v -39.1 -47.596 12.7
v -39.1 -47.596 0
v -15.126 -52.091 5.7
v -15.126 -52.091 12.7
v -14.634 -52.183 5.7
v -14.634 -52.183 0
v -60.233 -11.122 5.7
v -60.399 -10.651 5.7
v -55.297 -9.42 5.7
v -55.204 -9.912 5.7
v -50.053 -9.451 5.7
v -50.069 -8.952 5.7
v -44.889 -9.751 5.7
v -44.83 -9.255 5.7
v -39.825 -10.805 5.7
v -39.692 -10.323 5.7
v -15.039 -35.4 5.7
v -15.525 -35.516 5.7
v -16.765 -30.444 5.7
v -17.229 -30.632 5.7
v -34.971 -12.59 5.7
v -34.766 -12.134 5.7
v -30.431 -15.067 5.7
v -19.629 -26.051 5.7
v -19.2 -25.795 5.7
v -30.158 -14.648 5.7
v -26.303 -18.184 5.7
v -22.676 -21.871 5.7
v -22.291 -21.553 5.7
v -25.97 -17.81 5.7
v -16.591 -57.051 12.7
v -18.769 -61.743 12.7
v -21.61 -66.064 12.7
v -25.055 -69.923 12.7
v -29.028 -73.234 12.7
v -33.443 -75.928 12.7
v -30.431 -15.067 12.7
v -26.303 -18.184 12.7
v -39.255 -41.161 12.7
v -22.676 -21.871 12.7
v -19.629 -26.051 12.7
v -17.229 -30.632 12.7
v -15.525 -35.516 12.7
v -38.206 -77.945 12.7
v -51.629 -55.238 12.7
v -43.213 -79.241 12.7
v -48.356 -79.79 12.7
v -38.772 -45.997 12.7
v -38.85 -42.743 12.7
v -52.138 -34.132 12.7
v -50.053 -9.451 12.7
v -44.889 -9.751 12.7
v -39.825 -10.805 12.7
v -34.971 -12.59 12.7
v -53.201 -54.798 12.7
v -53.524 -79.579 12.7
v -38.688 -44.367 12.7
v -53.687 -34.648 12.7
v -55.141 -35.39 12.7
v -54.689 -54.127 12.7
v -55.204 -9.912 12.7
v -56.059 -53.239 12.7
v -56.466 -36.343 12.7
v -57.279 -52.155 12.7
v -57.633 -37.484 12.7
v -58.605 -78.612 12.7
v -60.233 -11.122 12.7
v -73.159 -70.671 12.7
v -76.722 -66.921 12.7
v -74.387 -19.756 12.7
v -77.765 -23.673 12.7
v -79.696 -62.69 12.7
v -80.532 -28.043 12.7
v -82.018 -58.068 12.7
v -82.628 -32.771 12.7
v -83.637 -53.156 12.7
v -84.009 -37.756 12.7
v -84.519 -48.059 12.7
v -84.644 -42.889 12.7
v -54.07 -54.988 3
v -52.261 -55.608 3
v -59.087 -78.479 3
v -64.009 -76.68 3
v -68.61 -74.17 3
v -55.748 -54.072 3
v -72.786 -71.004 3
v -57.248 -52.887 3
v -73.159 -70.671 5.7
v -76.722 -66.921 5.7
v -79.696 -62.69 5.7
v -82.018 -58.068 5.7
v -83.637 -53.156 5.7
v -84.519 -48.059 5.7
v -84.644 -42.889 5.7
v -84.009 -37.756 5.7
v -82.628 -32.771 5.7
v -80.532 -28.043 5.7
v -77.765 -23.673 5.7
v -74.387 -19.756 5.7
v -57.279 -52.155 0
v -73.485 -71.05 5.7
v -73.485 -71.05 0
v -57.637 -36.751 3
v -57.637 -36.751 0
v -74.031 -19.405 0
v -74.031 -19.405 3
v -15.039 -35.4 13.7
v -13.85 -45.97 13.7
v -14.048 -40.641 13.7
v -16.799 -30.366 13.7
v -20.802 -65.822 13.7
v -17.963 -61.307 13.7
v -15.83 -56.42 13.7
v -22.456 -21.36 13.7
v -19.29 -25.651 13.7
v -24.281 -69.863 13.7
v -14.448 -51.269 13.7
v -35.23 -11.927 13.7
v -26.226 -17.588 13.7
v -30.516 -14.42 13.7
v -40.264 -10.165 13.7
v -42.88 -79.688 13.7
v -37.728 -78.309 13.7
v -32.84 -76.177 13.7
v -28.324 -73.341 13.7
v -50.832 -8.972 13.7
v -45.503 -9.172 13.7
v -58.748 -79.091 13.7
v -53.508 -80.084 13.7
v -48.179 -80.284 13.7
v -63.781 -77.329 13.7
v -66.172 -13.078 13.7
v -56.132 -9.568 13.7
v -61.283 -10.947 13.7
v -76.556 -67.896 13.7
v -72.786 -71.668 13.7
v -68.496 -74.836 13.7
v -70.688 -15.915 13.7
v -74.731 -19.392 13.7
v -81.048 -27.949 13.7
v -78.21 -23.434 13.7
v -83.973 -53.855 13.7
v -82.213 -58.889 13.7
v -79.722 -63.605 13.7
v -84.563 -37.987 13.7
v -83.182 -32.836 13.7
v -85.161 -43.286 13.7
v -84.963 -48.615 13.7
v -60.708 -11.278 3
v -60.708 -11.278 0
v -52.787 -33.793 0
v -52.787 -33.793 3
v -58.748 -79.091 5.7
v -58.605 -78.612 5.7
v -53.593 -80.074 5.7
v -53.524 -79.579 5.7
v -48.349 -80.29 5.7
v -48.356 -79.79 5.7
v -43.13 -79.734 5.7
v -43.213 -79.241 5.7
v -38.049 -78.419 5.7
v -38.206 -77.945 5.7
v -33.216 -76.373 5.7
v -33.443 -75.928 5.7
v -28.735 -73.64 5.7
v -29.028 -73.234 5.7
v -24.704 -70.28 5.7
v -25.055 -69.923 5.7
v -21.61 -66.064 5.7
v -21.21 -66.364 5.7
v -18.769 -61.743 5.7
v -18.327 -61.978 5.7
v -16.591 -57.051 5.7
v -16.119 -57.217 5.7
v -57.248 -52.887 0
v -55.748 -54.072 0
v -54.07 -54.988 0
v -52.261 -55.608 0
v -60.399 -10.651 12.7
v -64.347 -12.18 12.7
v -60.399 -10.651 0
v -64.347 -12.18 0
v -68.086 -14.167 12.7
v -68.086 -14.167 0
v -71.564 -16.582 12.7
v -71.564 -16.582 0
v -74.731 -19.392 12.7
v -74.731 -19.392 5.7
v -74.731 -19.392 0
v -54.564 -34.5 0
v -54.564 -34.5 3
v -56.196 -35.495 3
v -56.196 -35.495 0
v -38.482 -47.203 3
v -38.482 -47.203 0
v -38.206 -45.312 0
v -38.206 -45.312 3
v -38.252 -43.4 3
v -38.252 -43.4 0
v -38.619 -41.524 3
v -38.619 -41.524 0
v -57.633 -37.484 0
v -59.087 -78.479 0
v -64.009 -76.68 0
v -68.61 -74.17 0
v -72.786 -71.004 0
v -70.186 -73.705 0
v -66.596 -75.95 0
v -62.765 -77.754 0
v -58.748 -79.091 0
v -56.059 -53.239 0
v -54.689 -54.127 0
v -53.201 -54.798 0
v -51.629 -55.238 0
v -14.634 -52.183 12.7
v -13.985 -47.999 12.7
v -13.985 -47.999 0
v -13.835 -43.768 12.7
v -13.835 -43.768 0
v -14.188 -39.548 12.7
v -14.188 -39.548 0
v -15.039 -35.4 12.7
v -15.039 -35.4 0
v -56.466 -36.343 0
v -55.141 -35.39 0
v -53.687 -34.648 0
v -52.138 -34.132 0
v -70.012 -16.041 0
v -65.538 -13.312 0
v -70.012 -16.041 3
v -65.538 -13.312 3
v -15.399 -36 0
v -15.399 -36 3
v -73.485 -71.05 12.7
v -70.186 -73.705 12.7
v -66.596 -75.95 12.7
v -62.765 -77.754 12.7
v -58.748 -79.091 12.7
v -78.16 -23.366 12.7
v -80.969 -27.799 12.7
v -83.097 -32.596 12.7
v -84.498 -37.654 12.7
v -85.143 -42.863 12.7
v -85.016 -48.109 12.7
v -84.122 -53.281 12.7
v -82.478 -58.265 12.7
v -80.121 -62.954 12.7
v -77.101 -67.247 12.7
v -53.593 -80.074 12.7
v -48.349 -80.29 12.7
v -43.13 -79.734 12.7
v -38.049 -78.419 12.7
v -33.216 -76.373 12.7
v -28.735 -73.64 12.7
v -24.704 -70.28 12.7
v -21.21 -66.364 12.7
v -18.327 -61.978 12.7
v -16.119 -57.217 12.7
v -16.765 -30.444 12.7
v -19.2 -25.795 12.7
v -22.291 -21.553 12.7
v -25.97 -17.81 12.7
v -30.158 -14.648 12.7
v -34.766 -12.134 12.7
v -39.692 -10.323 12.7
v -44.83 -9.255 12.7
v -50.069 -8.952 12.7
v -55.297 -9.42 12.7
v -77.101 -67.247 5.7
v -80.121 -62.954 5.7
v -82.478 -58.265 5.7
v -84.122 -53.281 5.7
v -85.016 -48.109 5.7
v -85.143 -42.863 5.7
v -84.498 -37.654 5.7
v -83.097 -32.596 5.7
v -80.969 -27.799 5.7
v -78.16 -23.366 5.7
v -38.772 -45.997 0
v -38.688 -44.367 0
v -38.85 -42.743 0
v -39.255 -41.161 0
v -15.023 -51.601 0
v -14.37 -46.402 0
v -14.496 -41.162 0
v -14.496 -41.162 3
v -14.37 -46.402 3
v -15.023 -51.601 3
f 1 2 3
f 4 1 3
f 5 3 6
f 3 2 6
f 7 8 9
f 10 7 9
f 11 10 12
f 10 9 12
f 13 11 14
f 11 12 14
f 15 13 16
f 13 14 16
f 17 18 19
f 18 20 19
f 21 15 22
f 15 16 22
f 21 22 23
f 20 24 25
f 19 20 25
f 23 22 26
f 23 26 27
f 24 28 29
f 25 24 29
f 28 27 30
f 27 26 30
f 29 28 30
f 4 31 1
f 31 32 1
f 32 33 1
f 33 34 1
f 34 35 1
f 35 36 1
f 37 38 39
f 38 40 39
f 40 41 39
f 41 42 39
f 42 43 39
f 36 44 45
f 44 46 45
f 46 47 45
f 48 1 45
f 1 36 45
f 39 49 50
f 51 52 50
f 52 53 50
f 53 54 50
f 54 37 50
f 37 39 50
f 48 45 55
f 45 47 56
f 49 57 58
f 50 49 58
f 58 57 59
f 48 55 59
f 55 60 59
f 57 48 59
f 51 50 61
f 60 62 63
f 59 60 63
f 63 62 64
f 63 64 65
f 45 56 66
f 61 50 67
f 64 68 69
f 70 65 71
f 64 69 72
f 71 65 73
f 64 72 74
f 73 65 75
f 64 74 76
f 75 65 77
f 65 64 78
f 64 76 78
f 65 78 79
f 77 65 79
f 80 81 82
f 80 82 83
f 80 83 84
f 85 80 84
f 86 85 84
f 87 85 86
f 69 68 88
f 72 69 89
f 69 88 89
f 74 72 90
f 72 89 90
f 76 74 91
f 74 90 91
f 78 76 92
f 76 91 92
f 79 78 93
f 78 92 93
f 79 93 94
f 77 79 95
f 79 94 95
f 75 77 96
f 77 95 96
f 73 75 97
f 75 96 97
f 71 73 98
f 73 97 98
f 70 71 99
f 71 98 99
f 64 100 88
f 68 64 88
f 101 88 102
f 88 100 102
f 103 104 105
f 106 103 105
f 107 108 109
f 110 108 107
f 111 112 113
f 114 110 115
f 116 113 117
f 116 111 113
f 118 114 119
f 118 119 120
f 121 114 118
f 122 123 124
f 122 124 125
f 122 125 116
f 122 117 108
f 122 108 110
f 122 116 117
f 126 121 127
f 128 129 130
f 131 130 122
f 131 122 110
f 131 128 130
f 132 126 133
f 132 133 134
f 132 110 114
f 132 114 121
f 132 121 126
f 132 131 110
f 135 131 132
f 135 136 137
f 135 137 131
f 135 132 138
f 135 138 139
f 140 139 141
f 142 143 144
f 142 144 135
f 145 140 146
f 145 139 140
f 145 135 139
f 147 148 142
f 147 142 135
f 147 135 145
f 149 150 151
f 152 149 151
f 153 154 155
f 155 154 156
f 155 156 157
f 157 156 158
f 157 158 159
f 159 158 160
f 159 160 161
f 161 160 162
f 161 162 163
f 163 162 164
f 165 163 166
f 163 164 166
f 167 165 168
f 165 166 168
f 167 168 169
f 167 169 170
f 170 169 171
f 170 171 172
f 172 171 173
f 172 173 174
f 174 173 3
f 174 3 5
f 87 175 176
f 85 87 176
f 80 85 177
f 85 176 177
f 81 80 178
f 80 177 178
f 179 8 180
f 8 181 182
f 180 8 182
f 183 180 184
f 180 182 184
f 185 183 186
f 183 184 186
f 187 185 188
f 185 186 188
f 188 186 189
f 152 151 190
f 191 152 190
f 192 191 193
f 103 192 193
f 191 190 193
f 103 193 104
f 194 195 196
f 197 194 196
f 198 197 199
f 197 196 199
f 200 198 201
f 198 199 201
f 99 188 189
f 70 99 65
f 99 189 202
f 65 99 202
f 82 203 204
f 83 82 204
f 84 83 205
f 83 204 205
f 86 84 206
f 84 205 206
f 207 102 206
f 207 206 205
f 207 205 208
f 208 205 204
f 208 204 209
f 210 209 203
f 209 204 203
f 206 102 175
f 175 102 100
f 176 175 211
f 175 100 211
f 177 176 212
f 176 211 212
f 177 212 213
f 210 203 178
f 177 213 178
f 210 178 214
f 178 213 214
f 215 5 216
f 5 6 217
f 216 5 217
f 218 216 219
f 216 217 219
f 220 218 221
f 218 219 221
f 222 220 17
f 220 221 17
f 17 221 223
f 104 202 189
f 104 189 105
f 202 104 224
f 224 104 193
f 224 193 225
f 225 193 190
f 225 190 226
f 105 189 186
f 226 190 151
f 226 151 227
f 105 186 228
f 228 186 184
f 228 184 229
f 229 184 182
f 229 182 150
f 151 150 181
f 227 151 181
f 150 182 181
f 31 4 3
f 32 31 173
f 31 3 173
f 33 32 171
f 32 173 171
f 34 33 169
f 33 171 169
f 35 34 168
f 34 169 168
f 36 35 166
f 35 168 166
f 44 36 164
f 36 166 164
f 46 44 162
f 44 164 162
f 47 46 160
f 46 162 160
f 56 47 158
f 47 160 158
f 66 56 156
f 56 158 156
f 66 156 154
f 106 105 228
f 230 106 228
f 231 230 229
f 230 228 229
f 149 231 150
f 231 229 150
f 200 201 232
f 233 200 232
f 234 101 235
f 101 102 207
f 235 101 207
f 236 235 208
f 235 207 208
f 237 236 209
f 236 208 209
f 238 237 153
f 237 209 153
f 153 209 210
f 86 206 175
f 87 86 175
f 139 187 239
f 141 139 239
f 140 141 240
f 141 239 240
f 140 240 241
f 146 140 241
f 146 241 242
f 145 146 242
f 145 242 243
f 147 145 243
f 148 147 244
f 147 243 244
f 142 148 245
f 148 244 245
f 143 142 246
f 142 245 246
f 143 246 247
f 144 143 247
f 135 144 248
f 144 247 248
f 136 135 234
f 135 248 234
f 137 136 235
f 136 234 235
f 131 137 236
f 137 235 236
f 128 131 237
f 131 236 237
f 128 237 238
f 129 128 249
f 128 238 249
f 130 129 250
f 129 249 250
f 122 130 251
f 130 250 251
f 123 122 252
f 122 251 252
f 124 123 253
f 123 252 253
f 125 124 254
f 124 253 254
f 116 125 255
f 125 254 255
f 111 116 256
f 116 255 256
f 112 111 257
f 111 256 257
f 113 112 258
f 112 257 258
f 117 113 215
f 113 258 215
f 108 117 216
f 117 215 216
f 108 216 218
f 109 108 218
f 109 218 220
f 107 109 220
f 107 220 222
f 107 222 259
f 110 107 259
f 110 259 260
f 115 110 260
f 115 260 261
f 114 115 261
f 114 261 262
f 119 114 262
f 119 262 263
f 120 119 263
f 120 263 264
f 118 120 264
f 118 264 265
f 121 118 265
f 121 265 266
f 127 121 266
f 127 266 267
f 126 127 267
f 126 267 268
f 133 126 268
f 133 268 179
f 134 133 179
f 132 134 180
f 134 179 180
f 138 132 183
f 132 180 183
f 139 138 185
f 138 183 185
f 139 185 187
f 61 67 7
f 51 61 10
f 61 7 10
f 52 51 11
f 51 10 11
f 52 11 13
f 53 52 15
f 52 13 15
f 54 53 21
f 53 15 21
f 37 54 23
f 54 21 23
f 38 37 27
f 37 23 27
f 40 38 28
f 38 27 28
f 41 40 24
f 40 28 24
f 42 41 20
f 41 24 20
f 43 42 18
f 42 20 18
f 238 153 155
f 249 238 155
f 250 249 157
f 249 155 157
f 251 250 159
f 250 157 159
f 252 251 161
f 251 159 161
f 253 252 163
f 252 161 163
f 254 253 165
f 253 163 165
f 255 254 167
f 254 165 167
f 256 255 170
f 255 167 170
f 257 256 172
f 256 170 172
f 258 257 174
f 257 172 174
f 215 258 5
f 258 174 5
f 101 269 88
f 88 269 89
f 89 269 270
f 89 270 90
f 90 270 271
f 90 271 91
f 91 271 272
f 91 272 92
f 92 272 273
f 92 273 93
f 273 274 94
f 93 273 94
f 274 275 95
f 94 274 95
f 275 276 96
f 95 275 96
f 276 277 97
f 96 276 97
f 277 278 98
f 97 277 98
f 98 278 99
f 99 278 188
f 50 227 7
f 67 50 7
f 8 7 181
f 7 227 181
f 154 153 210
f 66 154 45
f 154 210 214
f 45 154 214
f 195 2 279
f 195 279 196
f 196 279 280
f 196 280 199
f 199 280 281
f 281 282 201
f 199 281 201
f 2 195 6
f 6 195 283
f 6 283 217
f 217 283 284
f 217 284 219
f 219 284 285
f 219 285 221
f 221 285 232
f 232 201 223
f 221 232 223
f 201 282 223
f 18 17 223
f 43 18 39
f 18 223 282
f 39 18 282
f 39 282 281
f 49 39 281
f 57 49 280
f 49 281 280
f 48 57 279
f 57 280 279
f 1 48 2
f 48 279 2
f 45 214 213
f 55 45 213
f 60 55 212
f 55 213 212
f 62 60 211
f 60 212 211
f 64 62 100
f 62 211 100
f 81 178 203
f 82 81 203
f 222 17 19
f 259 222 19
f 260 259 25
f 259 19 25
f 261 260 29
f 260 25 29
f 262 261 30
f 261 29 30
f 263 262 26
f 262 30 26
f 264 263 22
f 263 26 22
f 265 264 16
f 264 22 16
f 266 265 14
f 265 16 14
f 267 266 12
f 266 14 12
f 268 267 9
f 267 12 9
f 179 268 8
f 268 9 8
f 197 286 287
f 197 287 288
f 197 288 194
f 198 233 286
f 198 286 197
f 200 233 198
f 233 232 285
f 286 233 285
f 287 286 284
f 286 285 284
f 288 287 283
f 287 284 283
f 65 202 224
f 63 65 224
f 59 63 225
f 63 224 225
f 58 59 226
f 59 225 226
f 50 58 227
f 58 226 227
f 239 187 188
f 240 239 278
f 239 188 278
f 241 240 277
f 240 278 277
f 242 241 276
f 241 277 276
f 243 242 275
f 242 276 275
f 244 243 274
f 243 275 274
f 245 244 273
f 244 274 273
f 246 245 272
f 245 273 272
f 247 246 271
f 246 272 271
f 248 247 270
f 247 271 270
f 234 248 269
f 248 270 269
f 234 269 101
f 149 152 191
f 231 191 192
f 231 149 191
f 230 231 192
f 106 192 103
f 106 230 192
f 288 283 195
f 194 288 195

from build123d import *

# Parameters (mm, degrees)
BOSS_EXTRUDE1_DEPTH   = 12.7
BOSS_EXTRUDE1_2_DEPTH = 12.7
BOSS_EXTRUDE1_3_DEPTH = 12.7
SKETCH3_R             = 35.68082971
BOSS_EXTRUDE2_DEPTH   = 1
CUT_EXTRUDE1_DEPTH    = 3
BOSS_EXTRUDE3_START   = 7
BOSS_EXTRUDE3_DEPTH   = 7


with BuildPart() as part:
    # Sketch2 → Boss-Extrude1 (new body)
    with BuildSketch(Plane.XY):
        with BuildLine():
            Line((-39.100035207, -47.596183278), (-14.633983159, -52.182948751))
            ThreePointArc((-14.633983159, -52.182948751), (-13.835344136, -43.767548454), (-15.038788838, -35.400439796))
            Line((-15.038788838, -35.400439796), (-39.255245143, -41.161460912))
            ThreePointArc((-39.255245143, -41.161460912), (-38.688115422, -44.36701442), (-39.100035207, -47.596183278))
        make_face()
    extrude(amount=BOSS_EXTRUDE1_DEPTH)



with BuildPart() as body_2:
    # Sketch2 → Boss-Extrude1 2 (new body)
    with BuildSketch(Plane.XY):
        with BuildLine():
            Line((-52.138110144, -34.132169435), (-60.398880747, -10.650564096))
            ThreePointArc((-60.398880747, -10.650564096), (-68.086150698, -14.166622561), (-74.730557001, -19.392390574))
            Line((-74.730557001, -19.392390574), (-57.633138211, -37.483946366))
            ThreePointArc((-57.633138211, -37.483946366), (-55.1406123, -35.390020866), (-52.138110144, -34.132169435))
        make_face()
    extrude(amount=BOSS_EXTRUDE1_2_DEPTH)


with BuildPart() as body_3:
    # Sketch2 → Boss-Extrude1 3 (new body)
    with BuildSketch(Plane.XY):
        with BuildLine():
            Line((-58.748050211, -79.091002811), (-51.629012696, -55.238425903))
            ThreePointArc((-51.629012696, -55.238425903), (-54.688668329, -54.126797895), (-57.2792507, -52.155480469))
            Line((-57.2792507, -52.155480469), (-73.484532144, -71.050320335))
            ThreePointArc((-73.484532144, -71.050320335), (-66.595901216, -75.949662166), (-58.748050211, -79.091002811))
        make_face()
    extrude(amount=BOSS_EXTRUDE1_3_DEPTH)


with BuildPart() as part_1:
    add(part.part)

    add(body_2.part)  # Boss-Extrude2 merges body 2
    # Sketch3 → Boss-Extrude2 (add)
    with BuildSketch(Plane.XY.offset(12.7)):
        with Locations(Location((-49.505798683, -44.627944394, 0), (0, 0, 134.987742115))):
            Circle(SKETCH3_R)
    extrude(amount=BOSS_EXTRUDE2_DEPTH)


with BuildPart() as cut_extrude1_tool:
    # Sketch4 → Cut-Extrude1 (new body)
    with BuildSketch(Plane(origin=(0, 0, 0), x_dir=(-1, 0, 0), z_dir=(0, 0, -1))):
        with BuildLine():
            Line((72.786303474, -71.004238215), (57.24818113, -52.887284523))
            ThreePointArc((57.24818113, -52.887284523), (54.928154107, -54.565713106), (52.261209215, -55.608331369))
            Line((52.261209215, -55.608331369), (59.087161374, -78.478915843))
            ThreePointArc((59.087161374, -78.478915843), (66.356415438, -75.510746955), (72.786303474, -71.004238215))
        make_face()
        with BuildLine():
            Line((38.618799354, -41.524006424), (15.39931612, -36.000162163))
            ThreePointArc((15.39931612, -36.000162163), (14.335198748, -43.779605292), (15.023005781, -51.601306045))
            Line((15.023005781, -51.601306045), (38.48180909, -47.203374214))
            ThreePointArc((38.48180909, -47.203374214), (38.18826081, -44.354957583), (38.618799354, -41.524006424))
        make_face()
        with BuildLine():
            Line((57.637387481, -36.751495388), (74.030918556, -19.404755176))
            ThreePointArc((74.030918556, -19.404755176), (67.825781865, -14.593480934), (60.708086795, -11.278288922))
            Line((60.708086795, -11.278288922), (52.78740583, -33.793174445))
            ThreePointArc((52.78740583, -33.793174445), (55.400981133, -34.963162493), (57.637387481, -36.751495388))
        make_face()
    extrude(amount=-CUT_EXTRUDE1_DEPTH)


with BuildPart() as part_2:
    add(part_1.part)

    # Cut-Extrude1: cut by cut_extrude1_tool
    add(cut_extrude1_tool.part, mode=Mode.SUBTRACT)



with BuildPart() as body_3_1:
    add(body_3.part)

    # Cut-Extrude1: cut by cut_extrude1_tool
    add(cut_extrude1_tool.part, mode=Mode.SUBTRACT)


with BuildPart() as part_3:
    add(part_2.part)

    add(body_3_1.part)  # Boss-Extrude3 merges body 3
    # Sketch5 → Boss-Extrude3 (add)
    with BuildSketch(Plane(origin=(0, 0, 12.7), x_dir=(-1, 0, 0), z_dir=(0, 0, -1)).offset(BOSS_EXTRUDE3_START)):
        with BuildLine():
            Line((73.484532144, -71.050320335), (73.148515106, -70.680060224))
            ThreePointArc((73.148515106, -70.680060224), (84.676398619, -45.476283496), (74.377079258, -19.746019596))
            Line((74.377079258, -19.746019596), (74.730557001, -19.392390574))
            ThreePointArc((74.730557001, -19.392390574), (85.176253231, -45.488340334), (73.484532144, -71.050320335))
        make_face()
        with BuildLine():
            Line((14.633983159, -52.182948751), (15.122646341, -52.077079515))
            ThreePointArc((15.122646341, -52.077079515), (31.185815502, -74.662407853), (58.618537366, -78.608067595))
            Line((58.618537366, -78.608067595), (58.748050211, -79.091002811))
            ThreePointArc((58.748050211, -79.091002811), (30.925446669, -75.089266226), (14.633983159, -52.182948751))
        make_face()
        with BuildLine():
            Line((15.521779426, -35.529745991), (15.038788838, -35.400439796))
            ThreePointArc((15.038788838, -35.400439796), (32.415696151, -13.306226622), (60.398880747, -10.650564096))
            Line((60.398880747, -10.650564096), (60.246234604, -11.126693443))
            ThreePointArc((60.246234604, -11.126693443), (32.655181929, -13.745141832), (15.521779426, -35.529745991))
        make_face()
    extrude(amount=-BOSS_EXTRUDE3_DEPTH)


solid = part_3.part
